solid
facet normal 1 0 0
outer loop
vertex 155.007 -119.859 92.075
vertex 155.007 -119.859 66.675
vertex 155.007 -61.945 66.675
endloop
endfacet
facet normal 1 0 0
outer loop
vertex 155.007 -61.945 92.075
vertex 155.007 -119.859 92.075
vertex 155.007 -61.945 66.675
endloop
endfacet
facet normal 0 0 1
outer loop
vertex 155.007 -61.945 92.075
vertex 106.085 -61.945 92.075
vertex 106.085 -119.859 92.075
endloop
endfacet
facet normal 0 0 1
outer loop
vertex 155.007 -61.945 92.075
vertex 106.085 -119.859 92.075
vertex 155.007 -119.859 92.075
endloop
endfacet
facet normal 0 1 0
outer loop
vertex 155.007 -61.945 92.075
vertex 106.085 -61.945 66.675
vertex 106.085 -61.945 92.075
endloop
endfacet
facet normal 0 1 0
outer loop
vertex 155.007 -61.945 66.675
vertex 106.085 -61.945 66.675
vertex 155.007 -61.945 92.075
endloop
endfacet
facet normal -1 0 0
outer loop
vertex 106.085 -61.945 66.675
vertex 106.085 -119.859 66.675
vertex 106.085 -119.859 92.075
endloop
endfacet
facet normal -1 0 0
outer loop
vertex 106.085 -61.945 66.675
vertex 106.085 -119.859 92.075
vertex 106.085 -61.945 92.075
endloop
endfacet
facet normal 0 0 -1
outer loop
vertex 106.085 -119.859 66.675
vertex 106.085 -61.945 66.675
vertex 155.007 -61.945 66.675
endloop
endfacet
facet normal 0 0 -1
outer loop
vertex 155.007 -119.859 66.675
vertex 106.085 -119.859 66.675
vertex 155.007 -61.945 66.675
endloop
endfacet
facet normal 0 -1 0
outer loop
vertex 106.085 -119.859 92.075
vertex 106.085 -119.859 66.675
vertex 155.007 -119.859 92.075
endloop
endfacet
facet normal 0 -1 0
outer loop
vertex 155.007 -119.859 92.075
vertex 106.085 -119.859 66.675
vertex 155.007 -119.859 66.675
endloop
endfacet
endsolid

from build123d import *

# Parameters (mm, degrees)
F1_DEPTH  = 63.5
F0_W      = 25.4
F0_H      = 19.05
F2_DEPTH  = 25.4
F3_DEPTH  = 7.9375
F5_R      = 5.08
F9_W      = 48.9222034812
F9_H      = 57.9138733447
F12_DEPTH = 25.4


# Not quite as in the source:
# - the program builds the solid bodies; features that only make, move or delete a surface that nothing else refers to are left out


with BuildPart() as f1:
    # F0 (on Front) → F1 (new body, symmetric)
    with BuildSketch(Plane.XZ):
        Polygon((22.225, 9.525), (-41.275, 9.525), (-41.275, -9.525), (41.275, -9.525), (41.275, 9.525), align=None)
    extrude(amount=F1_DEPTH, both=True)

    # F0 (on Front) → F2 (join, symmetric)
    with BuildSketch(Plane.XZ):
        with BuildLine():
            Line((22.225, 27.0002), (22.225, 9.525))
            Line((22.225, 9.525), (41.275, 9.525))
            Line((41.275, 9.525), (41.275, 27.0002))
            ThreePointArc((41.275, 27.0002), (45.9246798487, 38.2255201513), (57.15, 42.8752))
            Line((57.15, 42.8752), (60.325, 42.8752))
            Line((60.325, 42.8752), (60.325, 61.9252))
            Line((60.325, 61.9252), (57.15, 61.9252))
            add(Edge.make_bspline(
                [(53.8854342407, 61.7722898912), (54.9842067368, 61.8365871986), (56.0728453275, 61.8876096574), (57.15, 61.9252)],
                knots=[108.5245810491, 108.5245810491, 108.5245810491, 108.5245810491, 111.5045361635, 111.5045361635, 111.5045361635, 111.5045361635], degree=3))
            ThreePointArc((53.8854342407, 61.7722898912), (31.3258777096, 50.5133948686), (22.225, 27.0002))
        make_face()
        with Locations((73.025, 52.4002)):
            Rectangle(F0_W, F0_H)
    extrude(amount=F2_DEPTH, both=True)

    # F0 (on Front) → F3 (join, symmetric)
    with BuildSketch(Plane.XZ):
        with BuildLine():
            add(Edge.make_bspline(
                [(-41.275, 9.525), (-39.5856284224, 39.4828766469), (13.870125209, 59.4306981306), (53.8854342407, 61.7722898912)],
                knots=[0, 0, 0, 0, 108.5245810491, 108.5245810491, 108.5245810491, 108.5245810491], degree=3))
            Line((-41.275, 9.525), (22.225, 9.525))
            Line((22.225, 9.525), (22.225, 27.0002))
            ThreePointArc((22.225, 27.0002), (31.3258777096, 50.5133948686), (53.8854342407, 61.7722898912))
        make_face()
    extrude(amount=F3_DEPTH, both=True)

    # F0 (on Front) → F4 (revolve)
    with BuildSketch(Plane.XZ):
        Polygon((85.725, 66.675), (85.725, 61.9252), (85.725, 42.8752), (85.725, 38.1), (111.125, 38.1), (111.125, 66.675), align=None)
    revolve(axis=Axis((85.725, 0, 52.3875), (0, 0, 1)))

    # F5
    f5_edges = [f1.edges().sort_by_distance(p)[0] for p in [
        (41.275, -63.5, 0),
        (-41.275, -63.5, 0),
        (41.275, 63.5, 0),
        (-41.275, 63.5, 0),
    ]]
    fillet(f5_edges, radius=F5_R)


with BuildPart() as f12:
    # F9 (on face) → F12 (new body)
    with BuildSketch(Plane.XY.offset(66.675)):
        with Locations((130.5457092822, -90.9018423408)):
            Rectangle(F9_W, F9_H)
    extrude(amount=F12_DEPTH)


solid = f12.part
